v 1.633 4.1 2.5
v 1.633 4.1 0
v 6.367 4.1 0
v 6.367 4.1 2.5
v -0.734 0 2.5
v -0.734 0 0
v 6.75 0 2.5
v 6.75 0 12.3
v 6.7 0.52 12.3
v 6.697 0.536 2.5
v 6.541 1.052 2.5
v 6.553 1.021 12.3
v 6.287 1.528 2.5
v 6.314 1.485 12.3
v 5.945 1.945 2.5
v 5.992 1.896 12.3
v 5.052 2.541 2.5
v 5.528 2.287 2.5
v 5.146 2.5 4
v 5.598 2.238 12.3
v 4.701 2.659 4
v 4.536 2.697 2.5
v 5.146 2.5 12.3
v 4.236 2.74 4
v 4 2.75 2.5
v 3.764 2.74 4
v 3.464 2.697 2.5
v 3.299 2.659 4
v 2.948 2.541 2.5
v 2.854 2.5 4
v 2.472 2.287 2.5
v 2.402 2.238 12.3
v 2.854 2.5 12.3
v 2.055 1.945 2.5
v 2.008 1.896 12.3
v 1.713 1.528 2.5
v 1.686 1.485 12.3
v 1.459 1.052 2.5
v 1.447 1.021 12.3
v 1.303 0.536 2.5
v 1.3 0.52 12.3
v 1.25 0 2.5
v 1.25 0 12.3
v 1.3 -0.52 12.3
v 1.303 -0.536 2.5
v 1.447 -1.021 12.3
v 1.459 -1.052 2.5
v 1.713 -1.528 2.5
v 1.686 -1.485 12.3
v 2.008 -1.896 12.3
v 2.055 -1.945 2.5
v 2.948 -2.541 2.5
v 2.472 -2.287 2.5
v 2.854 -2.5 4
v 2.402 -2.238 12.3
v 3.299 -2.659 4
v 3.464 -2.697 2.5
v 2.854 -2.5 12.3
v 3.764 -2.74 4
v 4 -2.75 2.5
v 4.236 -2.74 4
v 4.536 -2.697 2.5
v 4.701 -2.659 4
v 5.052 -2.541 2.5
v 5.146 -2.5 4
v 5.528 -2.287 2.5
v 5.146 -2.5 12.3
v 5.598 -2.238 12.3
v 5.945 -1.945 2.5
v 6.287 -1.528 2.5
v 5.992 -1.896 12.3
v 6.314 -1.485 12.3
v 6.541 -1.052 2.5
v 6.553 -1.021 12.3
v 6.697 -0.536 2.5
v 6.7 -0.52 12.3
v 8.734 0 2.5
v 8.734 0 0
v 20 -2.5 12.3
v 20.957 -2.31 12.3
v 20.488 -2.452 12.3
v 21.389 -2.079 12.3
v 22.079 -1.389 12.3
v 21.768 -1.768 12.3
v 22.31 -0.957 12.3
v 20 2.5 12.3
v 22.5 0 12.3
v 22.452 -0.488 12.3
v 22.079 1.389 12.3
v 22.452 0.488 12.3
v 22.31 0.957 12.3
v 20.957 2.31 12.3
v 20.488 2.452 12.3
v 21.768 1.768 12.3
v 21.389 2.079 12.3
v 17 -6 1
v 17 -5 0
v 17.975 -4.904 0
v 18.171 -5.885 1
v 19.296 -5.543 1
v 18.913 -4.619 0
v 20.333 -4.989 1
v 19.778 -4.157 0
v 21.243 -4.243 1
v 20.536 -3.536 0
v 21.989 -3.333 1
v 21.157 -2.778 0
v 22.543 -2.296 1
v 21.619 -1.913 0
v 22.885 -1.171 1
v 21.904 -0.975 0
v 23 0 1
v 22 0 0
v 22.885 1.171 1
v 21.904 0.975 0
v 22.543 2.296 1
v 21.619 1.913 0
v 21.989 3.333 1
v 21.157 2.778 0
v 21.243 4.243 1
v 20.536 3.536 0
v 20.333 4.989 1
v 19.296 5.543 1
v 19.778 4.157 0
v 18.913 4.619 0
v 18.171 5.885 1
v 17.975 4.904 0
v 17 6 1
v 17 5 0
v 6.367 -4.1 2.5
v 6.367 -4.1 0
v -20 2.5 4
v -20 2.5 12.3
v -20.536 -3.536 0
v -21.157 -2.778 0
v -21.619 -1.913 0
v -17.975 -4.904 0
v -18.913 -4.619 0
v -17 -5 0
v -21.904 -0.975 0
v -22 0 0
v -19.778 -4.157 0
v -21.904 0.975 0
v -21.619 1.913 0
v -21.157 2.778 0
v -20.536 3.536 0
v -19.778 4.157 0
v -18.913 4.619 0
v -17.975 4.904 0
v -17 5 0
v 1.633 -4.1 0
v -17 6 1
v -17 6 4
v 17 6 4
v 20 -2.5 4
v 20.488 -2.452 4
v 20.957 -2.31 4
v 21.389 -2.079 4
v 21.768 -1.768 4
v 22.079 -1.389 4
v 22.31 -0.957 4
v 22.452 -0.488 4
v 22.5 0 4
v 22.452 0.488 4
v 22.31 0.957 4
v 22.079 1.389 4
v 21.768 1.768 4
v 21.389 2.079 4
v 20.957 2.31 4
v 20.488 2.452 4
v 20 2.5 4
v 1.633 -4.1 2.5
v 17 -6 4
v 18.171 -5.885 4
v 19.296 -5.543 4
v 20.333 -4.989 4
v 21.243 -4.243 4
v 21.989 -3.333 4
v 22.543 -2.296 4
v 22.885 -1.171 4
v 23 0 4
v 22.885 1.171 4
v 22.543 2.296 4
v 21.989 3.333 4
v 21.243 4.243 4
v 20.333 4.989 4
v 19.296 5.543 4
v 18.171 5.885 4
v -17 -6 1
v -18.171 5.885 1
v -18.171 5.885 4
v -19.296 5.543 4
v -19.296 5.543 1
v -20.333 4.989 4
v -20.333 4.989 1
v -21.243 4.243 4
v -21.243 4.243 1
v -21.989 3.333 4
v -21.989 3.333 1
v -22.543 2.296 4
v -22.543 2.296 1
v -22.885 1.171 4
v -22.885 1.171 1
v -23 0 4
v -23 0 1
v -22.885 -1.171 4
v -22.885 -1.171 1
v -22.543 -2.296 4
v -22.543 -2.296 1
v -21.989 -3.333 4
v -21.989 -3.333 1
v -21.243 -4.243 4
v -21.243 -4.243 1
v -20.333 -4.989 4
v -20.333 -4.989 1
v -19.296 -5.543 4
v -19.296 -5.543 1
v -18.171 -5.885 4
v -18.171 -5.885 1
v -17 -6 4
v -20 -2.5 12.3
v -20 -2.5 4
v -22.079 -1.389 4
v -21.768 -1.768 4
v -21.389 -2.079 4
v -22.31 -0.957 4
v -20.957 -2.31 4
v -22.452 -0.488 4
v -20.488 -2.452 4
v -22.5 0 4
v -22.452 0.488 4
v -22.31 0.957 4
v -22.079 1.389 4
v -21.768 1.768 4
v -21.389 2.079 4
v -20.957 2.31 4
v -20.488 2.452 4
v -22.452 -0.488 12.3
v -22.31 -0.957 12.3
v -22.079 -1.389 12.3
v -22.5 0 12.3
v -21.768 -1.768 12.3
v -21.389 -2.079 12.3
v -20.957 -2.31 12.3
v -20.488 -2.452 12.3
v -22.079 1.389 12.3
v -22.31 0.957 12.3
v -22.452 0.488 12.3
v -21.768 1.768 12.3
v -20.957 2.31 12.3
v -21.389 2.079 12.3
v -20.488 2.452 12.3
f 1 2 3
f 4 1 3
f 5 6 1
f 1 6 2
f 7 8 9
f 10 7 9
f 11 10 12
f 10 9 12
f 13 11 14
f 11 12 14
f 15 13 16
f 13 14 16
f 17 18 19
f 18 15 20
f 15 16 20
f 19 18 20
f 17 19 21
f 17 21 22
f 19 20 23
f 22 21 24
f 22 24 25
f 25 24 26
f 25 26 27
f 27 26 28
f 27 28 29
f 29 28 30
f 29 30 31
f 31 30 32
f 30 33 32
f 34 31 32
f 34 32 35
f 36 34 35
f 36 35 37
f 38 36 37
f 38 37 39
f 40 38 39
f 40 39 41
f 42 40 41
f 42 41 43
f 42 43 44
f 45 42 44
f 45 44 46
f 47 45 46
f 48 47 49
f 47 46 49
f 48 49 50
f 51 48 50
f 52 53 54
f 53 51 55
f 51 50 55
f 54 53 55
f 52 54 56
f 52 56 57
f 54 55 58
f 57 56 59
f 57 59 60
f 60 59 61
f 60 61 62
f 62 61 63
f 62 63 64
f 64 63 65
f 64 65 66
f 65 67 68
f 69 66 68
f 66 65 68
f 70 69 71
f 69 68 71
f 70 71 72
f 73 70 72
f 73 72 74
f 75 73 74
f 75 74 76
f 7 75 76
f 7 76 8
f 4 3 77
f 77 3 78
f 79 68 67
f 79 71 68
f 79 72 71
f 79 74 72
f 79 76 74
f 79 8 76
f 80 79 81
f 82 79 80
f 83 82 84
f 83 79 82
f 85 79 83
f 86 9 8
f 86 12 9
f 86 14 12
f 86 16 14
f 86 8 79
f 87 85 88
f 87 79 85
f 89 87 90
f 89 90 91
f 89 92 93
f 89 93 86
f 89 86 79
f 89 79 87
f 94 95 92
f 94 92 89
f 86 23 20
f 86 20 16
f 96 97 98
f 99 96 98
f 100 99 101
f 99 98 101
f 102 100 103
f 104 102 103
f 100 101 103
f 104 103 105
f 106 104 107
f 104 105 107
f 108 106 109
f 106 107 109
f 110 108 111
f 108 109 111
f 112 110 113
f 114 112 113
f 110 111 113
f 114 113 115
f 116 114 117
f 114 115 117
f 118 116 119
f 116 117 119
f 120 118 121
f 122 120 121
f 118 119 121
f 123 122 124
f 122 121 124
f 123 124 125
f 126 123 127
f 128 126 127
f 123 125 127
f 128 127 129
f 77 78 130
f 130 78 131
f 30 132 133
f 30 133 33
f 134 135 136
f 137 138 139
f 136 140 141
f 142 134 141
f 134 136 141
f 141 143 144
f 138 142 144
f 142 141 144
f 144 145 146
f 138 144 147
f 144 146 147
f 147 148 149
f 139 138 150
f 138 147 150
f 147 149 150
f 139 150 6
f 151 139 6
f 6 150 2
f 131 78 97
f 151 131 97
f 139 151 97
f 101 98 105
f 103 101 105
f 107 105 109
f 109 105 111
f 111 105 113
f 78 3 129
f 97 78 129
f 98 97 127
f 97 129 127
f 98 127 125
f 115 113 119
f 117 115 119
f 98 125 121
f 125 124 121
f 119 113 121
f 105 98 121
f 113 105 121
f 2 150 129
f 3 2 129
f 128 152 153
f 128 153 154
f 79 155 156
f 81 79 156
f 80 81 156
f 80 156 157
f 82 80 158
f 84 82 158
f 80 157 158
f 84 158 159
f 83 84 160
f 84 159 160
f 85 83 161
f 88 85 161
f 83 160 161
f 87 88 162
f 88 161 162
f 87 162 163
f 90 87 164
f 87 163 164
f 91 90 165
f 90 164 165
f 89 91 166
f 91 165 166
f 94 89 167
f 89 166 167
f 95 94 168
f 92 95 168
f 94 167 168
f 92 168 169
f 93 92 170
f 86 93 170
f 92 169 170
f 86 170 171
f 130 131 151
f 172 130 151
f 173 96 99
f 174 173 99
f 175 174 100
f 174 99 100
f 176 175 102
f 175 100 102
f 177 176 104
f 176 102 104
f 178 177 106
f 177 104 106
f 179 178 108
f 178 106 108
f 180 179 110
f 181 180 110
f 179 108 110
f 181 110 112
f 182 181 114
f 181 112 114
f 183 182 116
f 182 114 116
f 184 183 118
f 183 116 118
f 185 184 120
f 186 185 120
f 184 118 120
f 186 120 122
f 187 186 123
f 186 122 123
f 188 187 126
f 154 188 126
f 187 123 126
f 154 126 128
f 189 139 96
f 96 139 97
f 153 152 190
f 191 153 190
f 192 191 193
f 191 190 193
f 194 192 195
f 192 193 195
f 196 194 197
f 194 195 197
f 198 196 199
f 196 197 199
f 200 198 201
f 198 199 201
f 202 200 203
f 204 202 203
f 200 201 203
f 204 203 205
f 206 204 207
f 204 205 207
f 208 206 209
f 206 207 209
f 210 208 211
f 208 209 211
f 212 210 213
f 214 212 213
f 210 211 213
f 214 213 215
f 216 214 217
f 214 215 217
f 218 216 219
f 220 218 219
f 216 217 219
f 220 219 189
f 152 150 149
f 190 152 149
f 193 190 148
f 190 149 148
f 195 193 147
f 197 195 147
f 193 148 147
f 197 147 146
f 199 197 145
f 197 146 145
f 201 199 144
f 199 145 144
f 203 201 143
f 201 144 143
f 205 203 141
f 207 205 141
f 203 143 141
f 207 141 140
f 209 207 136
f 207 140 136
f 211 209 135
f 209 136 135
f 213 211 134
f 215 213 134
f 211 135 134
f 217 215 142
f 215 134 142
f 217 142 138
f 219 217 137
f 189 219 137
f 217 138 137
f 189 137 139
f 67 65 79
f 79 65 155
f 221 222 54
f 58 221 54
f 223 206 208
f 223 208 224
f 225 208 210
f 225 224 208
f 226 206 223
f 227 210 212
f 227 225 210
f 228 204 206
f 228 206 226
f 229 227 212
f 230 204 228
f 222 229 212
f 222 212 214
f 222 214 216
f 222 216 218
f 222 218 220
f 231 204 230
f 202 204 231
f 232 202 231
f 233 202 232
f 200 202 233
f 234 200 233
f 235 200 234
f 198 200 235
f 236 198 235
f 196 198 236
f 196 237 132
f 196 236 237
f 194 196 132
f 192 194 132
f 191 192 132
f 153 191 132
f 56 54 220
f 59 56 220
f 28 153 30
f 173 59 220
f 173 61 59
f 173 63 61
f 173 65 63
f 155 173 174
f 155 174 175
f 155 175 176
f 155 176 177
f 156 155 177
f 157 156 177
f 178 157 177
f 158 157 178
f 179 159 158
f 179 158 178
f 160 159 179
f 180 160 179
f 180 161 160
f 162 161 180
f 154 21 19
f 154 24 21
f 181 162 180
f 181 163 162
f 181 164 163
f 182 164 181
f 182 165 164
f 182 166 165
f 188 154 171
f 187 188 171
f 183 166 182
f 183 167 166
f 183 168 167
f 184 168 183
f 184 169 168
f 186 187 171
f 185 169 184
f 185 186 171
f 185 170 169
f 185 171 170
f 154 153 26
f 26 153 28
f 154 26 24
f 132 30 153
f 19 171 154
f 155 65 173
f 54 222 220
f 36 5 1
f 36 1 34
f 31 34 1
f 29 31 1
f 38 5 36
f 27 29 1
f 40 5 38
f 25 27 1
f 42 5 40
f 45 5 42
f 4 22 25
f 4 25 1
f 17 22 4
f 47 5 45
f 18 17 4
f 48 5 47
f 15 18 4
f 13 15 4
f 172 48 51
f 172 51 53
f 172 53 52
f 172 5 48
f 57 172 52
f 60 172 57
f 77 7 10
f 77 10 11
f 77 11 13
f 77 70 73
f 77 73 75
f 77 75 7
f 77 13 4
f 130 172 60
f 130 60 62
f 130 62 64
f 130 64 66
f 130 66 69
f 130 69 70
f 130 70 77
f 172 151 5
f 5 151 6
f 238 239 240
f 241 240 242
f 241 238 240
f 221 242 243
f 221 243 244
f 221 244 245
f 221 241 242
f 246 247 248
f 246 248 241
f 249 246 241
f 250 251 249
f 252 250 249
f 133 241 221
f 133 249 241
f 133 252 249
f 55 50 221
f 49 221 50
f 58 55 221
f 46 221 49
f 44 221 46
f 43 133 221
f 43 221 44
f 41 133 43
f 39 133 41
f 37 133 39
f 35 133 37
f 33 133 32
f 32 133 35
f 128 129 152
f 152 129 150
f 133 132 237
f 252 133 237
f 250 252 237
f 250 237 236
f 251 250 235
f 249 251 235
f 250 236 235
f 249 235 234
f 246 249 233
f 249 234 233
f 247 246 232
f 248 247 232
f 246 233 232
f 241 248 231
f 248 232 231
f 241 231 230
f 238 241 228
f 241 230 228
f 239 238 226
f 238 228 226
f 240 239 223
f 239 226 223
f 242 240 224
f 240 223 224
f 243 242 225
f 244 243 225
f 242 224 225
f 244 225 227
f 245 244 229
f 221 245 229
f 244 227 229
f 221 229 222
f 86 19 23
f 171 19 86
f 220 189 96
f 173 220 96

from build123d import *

# Parameters (mm, degrees)
PAD_DEPTH       = 4
PAD001_DEPTH    = 8.3
SKETCH002_R     = 2.75
POCKET_DEPTH    = 12.301
POCKET001_DEPTH = 2.5
CHAMFER_SIZE    = 1


with BuildPart() as part:
    # Sketch → Pad (new body)
    with BuildSketch(Plane.XY):
        with BuildLine():
            ThreePointArc((-17, 6), (-23, 0), (-17, -6))
            Line((-17, -6), (17, -6))
            ThreePointArc((17, -6), (23, 0), (17, 6))
            Line((-17, 6), (17, 6))
        make_face()
    extrude(amount=PAD_DEPTH)

    # Sketch001 → Pad001 (new body)
    with BuildSketch(Plane.XY.offset(4)):
        with BuildLine():
            ThreePointArc((-20, 2.5), (-22.5, 0), (-20, -2.5))
            Line((-20, -2.5), (20, -2.5))
            ThreePointArc((20, -2.5), (22.5, 0), (20, 2.5))
            Line((-20, 2.5), (20, 2.5))
        make_face()
    extrude(amount=PAD001_DEPTH)

    # Sketch002 → Pocket (cut, through all)
    with BuildSketch(Plane.XY.offset(12.3)):
        with Locations((4, 0)):
            Circle(SKETCH002_R)
    extrude(amount=-POCKET_DEPTH, mode=Mode.SUBTRACT)

    # Sketch003 → Pocket001 (cut)
    with BuildSketch(Plane(origin=(0, 0, 0), x_dir=(1, 0, 0), z_dir=(0, 0, -1))):
        Polygon((8.734272, 0), (6.367136, 4.1), (1.632864, 4.1), (-0.734272, 0), (1.632864, -4.1), (6.367136, -4.1), align=None)
    extrude(amount=-POCKET001_DEPTH, mode=Mode.SUBTRACT)

    # Chamfer
    chamfer_edges = [part.edges().sort_by_distance(p)[0] for p in [
        (0, -6, 0),
    ]]
    chamfer(chamfer_edges, length=CHAMFER_SIZE)


solid = part.part
